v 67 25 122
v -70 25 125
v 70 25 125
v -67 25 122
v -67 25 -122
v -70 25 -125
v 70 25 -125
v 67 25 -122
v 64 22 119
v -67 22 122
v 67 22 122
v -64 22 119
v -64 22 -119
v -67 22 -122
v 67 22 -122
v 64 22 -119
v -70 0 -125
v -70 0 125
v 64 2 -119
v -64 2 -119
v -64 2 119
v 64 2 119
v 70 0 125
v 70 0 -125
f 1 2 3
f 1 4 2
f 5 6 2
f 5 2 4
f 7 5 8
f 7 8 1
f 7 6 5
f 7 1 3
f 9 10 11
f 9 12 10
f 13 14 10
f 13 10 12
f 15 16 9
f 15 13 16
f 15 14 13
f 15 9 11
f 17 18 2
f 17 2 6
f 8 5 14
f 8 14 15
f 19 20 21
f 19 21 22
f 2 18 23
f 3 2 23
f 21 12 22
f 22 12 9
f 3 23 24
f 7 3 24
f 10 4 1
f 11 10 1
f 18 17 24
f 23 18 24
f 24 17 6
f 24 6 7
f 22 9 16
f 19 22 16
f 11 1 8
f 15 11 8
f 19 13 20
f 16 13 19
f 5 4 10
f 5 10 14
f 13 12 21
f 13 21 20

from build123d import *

# Parameters (mm, degrees)
SKETCH1_W           = 140
SKETCH1_H           = 250
BOSS_EXTRUDE1_DEPTH = 25
SKETCH2_W           = 128
SKETCH2_H           = 238
CUT_EXTRUDE1_DEPTH  = 23
SKETCH4_W           = 134
SKETCH4_H           = 244
CUT_EXTRUDE2_DEPTH  = 3


with BuildPart() as part:
    # Sketch1 → Boss-Extrude1 (new body)
    with BuildSketch(Plane(origin=(0, 0, 0), x_dir=(1, 0, 0), z_dir=(0, 1, 0))):
        Rectangle(SKETCH1_W, SKETCH1_H)
    extrude(amount=BOSS_EXTRUDE1_DEPTH)

    # Sketch2 → Cut-Extrude1 (cut)
    with BuildSketch(Plane(origin=(0, 25, 0), x_dir=(1, 0, 0), z_dir=(0, 1, 0))):
        Rectangle(SKETCH2_W, SKETCH2_H)
    extrude(amount=-CUT_EXTRUDE1_DEPTH, mode=Mode.SUBTRACT)

    # Sketch4 → Cut-Extrude2 (cut)
    with BuildSketch(Plane(origin=(0, 25, 0), x_dir=(1, 0, 0), z_dir=(0, 1, 0))):
        Rectangle(SKETCH4_W, SKETCH4_H)
    extrude(amount=-CUT_EXTRUDE2_DEPTH, mode=Mode.SUBTRACT)


solid = part.part
